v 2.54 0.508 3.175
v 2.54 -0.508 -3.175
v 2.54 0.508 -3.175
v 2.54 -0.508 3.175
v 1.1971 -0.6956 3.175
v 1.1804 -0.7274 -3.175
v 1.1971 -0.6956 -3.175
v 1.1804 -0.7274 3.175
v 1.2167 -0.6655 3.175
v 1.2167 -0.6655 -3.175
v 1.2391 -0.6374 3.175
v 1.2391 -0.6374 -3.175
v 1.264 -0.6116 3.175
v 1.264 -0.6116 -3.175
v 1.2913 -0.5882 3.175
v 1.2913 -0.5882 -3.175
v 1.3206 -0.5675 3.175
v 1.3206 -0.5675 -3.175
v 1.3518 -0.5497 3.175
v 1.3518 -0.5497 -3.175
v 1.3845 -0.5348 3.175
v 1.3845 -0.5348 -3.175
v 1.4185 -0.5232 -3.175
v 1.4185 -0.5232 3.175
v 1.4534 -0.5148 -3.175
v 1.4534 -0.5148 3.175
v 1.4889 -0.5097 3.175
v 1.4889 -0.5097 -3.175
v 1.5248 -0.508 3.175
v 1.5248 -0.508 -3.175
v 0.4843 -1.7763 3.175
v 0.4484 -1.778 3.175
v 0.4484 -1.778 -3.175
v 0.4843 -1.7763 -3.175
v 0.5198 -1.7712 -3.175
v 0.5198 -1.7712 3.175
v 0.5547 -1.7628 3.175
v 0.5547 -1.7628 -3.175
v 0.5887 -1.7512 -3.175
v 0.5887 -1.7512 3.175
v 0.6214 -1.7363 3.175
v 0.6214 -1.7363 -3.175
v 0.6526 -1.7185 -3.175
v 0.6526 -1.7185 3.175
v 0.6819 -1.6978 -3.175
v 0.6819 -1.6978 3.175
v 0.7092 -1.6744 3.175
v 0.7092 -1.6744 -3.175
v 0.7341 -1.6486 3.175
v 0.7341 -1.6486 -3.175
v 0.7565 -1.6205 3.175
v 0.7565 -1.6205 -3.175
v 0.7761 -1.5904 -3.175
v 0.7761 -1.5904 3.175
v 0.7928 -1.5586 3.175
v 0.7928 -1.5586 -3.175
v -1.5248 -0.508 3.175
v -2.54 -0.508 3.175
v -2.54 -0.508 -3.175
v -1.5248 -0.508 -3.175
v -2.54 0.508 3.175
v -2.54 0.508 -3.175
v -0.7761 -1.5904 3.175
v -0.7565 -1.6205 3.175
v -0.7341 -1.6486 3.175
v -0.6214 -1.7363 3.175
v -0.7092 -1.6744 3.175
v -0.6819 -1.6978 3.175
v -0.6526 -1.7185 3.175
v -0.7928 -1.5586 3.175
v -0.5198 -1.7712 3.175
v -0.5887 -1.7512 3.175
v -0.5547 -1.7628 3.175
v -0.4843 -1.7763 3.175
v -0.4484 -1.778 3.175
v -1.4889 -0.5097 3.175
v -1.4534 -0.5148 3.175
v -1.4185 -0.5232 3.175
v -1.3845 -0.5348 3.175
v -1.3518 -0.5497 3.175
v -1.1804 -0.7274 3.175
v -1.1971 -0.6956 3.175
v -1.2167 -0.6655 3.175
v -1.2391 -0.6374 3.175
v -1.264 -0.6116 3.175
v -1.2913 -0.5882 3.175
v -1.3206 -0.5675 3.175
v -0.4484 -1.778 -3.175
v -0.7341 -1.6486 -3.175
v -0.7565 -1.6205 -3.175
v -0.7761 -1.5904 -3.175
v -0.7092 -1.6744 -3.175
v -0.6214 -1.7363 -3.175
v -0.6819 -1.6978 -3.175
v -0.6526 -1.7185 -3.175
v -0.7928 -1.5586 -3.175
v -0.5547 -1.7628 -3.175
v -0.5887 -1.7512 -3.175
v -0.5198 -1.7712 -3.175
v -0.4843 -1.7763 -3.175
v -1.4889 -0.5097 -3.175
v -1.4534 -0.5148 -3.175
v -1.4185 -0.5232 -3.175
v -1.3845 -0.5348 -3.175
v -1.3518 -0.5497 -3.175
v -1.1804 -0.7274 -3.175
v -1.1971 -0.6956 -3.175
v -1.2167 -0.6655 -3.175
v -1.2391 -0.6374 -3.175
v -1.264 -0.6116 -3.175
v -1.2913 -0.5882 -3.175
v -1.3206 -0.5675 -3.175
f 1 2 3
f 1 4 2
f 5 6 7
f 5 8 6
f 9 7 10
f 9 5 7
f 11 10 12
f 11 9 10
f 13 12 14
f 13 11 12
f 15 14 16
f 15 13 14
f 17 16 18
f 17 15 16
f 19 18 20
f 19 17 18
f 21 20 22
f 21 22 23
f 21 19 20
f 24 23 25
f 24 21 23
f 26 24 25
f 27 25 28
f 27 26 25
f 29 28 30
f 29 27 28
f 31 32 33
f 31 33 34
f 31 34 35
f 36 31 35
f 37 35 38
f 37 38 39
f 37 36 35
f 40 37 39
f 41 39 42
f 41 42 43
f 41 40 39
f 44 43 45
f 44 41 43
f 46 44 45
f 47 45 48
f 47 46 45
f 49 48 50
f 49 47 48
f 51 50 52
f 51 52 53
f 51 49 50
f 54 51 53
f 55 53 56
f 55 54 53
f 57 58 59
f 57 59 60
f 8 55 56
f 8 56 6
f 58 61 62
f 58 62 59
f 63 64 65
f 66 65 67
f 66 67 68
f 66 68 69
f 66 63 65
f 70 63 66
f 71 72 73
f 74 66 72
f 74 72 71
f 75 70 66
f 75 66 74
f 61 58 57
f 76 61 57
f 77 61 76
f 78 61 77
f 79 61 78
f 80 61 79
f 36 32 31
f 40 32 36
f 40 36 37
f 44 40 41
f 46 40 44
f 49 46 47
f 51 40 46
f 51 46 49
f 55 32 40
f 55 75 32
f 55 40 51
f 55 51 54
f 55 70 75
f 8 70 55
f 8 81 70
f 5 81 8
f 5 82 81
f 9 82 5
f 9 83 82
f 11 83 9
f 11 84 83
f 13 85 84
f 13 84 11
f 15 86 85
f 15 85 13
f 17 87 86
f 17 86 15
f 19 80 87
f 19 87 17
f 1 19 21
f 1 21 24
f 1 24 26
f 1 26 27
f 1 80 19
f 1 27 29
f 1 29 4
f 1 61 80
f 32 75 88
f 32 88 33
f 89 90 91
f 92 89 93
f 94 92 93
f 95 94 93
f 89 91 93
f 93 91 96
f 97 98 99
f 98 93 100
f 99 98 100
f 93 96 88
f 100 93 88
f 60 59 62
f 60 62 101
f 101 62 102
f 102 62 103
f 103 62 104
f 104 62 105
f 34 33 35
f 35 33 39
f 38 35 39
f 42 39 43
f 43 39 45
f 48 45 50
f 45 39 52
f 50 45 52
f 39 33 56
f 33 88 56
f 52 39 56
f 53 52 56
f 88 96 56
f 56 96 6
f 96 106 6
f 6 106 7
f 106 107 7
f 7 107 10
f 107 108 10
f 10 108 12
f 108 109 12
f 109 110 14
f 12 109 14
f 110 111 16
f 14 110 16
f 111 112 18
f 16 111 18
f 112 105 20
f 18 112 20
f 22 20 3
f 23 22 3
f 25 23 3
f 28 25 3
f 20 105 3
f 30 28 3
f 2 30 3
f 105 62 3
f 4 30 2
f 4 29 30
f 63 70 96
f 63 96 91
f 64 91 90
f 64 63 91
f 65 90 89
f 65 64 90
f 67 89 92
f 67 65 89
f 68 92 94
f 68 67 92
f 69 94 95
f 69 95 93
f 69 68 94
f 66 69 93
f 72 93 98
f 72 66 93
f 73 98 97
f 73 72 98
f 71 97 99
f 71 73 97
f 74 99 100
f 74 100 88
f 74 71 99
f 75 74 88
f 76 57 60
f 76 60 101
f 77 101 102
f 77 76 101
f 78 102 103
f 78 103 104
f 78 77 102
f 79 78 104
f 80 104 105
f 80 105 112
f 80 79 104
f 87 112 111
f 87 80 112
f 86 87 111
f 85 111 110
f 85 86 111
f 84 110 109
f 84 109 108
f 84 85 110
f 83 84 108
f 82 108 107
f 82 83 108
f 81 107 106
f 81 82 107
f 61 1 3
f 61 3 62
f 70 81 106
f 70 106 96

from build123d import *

# Parameters (mm, degrees)
BOSS_EXTRUDE1_DEPTH = 3.175


with BuildPart() as part:
    # Sketch1 → Boss-Extrude1 (new, symmetric)
    with BuildSketch(Plane.XY):
        with BuildLine():
            Line((2.54, -0.508), (2.54, 0.508))
            Line((2.54, 0.508), (-2.54, 0.508))
            Line((-2.54, 0.508), (-2.54, -0.508))
            Line((-2.54, -0.508), (-1.524786699, -0.508))
            ThreePointArc((-1.524786699, -0.508), (-1.320612848, -0.567511251), (-1.18038974, -0.727405061))
            Line((-1.18038974, -0.727405061), (-0.792799534, -1.558594939))
            ThreePointArc((-0.792799534, -1.558594939), (-0.652576426, -1.718488749), (-0.448402575, -1.778))
            Line((-0.448402575, -1.778), (0.448402575, -1.778))
            ThreePointArc((0.448402575, -1.778), (0.652576426, -1.718488749), (0.792799534, -1.558594939))
            Line((0.792799534, -1.558594939), (1.18038974, -0.727405061))
            ThreePointArc((1.18038974, -0.727405061), (1.320612848, -0.567511251), (1.524786699, -0.508))
            Line((1.524786699, -0.508), (2.54, -0.508))
        make_face()
    extrude(amount=BOSS_EXTRUDE1_DEPTH, both=True)


solid = part.part
